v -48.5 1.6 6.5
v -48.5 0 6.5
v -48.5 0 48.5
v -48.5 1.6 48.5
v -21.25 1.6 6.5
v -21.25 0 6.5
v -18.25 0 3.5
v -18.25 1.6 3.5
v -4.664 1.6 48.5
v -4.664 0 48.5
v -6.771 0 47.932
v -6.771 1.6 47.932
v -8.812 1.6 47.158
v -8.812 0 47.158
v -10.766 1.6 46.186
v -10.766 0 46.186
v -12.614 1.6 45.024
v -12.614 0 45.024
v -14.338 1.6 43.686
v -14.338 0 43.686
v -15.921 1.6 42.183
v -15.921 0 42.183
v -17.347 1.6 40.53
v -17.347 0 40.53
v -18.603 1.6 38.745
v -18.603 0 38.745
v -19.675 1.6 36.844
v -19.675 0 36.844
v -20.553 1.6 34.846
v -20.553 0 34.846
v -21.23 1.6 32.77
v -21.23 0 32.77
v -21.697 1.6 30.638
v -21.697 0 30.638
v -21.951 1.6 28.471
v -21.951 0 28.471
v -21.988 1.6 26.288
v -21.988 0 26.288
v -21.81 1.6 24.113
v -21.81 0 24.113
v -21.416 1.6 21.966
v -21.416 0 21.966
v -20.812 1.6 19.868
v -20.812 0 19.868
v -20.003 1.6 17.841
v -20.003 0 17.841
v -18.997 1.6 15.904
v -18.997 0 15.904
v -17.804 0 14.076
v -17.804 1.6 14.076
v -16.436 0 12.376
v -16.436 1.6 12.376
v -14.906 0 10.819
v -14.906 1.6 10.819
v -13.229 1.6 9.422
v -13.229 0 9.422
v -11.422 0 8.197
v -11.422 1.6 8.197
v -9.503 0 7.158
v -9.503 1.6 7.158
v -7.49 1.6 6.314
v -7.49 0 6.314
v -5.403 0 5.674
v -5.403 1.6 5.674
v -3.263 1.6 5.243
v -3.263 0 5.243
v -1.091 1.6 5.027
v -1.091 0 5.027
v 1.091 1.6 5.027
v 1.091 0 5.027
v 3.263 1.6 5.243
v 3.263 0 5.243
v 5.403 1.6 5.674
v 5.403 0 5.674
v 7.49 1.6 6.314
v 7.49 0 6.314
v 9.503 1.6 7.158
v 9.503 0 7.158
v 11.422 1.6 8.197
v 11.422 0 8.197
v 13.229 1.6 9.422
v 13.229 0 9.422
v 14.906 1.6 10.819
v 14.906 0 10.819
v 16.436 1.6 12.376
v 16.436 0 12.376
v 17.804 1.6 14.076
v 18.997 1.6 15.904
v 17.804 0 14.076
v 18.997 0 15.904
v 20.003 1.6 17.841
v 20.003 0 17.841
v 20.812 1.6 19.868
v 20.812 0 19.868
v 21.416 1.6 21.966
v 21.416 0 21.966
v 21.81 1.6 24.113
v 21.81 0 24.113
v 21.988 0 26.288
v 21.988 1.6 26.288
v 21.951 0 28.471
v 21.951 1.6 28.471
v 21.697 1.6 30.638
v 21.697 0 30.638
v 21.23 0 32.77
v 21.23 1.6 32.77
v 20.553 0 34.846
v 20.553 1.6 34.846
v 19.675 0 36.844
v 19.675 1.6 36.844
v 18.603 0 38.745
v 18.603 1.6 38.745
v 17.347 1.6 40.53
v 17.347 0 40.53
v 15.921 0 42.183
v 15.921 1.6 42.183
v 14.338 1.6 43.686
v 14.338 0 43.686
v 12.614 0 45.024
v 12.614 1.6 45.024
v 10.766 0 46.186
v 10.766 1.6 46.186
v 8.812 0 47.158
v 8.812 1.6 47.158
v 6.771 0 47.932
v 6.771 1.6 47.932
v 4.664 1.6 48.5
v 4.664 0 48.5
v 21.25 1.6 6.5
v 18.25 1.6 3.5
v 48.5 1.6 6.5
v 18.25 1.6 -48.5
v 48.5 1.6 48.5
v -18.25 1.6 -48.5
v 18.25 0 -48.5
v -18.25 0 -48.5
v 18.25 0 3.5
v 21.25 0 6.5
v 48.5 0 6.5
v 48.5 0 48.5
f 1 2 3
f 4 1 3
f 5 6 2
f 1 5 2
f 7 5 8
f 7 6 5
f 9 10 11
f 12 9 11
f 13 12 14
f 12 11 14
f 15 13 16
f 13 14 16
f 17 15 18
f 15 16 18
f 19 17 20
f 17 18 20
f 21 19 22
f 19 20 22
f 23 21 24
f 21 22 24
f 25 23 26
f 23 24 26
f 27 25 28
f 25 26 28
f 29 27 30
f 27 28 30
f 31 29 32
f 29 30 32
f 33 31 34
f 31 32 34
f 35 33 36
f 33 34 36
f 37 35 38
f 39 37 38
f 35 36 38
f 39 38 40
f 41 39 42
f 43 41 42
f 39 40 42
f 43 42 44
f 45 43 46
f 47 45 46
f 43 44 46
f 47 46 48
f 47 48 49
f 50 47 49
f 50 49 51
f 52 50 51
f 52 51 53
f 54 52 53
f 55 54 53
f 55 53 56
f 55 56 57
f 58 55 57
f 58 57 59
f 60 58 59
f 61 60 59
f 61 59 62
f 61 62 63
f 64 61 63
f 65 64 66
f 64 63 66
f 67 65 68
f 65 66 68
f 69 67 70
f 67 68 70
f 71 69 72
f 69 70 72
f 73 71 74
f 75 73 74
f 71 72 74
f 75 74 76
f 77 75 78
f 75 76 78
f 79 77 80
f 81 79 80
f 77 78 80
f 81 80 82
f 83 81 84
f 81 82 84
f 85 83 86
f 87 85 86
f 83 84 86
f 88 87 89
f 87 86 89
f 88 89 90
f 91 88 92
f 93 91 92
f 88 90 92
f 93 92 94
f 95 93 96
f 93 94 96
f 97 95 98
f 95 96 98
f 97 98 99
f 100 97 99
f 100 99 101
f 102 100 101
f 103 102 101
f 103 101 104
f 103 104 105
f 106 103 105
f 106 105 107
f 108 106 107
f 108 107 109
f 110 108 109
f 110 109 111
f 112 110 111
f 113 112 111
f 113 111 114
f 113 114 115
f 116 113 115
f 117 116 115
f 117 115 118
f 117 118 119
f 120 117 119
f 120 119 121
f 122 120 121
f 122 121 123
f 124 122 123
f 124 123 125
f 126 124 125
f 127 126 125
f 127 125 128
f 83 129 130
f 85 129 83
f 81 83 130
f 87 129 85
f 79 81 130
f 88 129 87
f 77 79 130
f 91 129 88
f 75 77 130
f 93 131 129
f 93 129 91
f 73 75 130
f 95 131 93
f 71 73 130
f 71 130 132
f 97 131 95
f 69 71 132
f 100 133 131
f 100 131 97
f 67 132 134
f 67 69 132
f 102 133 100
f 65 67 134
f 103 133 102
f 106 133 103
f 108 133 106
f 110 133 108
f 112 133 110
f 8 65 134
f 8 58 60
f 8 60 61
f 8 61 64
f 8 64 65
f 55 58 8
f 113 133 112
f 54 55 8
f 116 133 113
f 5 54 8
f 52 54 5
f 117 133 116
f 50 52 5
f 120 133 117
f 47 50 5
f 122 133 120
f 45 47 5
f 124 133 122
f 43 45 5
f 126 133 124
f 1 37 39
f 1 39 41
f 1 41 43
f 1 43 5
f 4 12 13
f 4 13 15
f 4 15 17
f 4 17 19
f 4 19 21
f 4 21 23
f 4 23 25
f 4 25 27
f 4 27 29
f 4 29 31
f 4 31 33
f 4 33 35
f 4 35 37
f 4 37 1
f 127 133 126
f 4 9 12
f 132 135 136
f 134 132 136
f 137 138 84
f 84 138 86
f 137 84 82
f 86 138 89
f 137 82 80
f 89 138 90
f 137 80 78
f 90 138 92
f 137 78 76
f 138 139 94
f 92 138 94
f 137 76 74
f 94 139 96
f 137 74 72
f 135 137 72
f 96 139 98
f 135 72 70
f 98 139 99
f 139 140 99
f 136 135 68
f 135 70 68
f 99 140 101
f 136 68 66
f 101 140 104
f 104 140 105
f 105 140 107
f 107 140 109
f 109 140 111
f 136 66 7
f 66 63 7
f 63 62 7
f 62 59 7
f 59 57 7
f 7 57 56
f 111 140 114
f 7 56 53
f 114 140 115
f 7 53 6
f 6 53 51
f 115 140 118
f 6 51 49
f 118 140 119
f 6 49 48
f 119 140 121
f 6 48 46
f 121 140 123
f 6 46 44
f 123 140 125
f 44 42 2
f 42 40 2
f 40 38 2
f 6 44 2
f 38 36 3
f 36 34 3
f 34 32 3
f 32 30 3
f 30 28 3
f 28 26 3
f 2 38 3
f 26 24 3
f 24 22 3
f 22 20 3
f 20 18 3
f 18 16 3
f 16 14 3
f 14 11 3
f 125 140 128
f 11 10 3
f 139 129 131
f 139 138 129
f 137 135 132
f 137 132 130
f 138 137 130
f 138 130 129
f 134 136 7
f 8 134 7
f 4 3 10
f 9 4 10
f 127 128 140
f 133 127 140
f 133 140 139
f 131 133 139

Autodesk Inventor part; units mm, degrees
ref_plane "YZ Plane" through (0, 0, 0) normal (1, 0, 0) x (0, 1, 0)
ref_plane "XZ Plane" through (0, 0, 0) normal (0, 1, 0) x (-1, 0, 0)
ref_plane "XY Plane" through (0, 0, 0) normal (0, 0, 1) x (1, 0, 0)
sketch "Sketch2" plane through (0, 0, 0) normal (0, 1, 0) x (-1, 0, 0)
  line L0 (48.5, 48.5) -> (-48.5, 48.5)
  line L1 (-48.5, 48.5) -> (-48.5, -48.5)
  line L2 (-48.5, -48.5) -> (48.5, -48.5)
  line L3 (48.5, -48.5) -> (48.5, 48.5)
  circle A0 centre (0, 27) radius 22
  line L4 (48.5, -48.5) -> (18.25, -48.5)
  line L5 (18.25, -48.5) -> (18.25, 6.5)
  line L6 (18.25, 6.5) -> (48.5, 6.5)
  line L7 (48.5, 6.5) -> (48.5, -48.5)
  line L8 (-48.5, -48.5) -> (-18.25, -48.5)
  line L9 (-18.25, -48.5) -> (-18.25, 6.5)
  line L10 (-18.25, 6.5) -> (-48.5, 6.5)
  line L11 (-48.5, 6.5) -> (-48.5, -48.5)
  line L12 (21.25, 6.5) -> (18.25, 3.5)
  line L13 (-18.25, 3.5) -> (-21.25, 6.5)
  point P0 (0, 0)
  point P1 (-48.5, 6.5)
  point P2 (18.25, -48.5)
  point P3 (48.5, 6.5)
  dimension "d1" = 44
  dimension "d2" = 97
  dimension "d3" = 97
  dimension "d4" = 48.5
  dimension "d5" = 48.5
  dimension "d8" = 30.25
  dimension "d9" = 30.25
  dimension "d10" = 55
  dimension "d11" = 55
  dimension "d14" = 0
  dimension "d15" = 45
  dimension "d16" = 3
  dimension "d17" = 3
  dimension "d18" = 21.5
  dimension "d19" = 27
extrude "Extrusion1" add sketch "Sketch2" along normal blind 1.6 contours L3 L6 L5 L2 L9 L10 L1 L0 A0 | L12 L5 L6 | L10 L9 L13
properties part number "pcb" material "UHMW, Black"
